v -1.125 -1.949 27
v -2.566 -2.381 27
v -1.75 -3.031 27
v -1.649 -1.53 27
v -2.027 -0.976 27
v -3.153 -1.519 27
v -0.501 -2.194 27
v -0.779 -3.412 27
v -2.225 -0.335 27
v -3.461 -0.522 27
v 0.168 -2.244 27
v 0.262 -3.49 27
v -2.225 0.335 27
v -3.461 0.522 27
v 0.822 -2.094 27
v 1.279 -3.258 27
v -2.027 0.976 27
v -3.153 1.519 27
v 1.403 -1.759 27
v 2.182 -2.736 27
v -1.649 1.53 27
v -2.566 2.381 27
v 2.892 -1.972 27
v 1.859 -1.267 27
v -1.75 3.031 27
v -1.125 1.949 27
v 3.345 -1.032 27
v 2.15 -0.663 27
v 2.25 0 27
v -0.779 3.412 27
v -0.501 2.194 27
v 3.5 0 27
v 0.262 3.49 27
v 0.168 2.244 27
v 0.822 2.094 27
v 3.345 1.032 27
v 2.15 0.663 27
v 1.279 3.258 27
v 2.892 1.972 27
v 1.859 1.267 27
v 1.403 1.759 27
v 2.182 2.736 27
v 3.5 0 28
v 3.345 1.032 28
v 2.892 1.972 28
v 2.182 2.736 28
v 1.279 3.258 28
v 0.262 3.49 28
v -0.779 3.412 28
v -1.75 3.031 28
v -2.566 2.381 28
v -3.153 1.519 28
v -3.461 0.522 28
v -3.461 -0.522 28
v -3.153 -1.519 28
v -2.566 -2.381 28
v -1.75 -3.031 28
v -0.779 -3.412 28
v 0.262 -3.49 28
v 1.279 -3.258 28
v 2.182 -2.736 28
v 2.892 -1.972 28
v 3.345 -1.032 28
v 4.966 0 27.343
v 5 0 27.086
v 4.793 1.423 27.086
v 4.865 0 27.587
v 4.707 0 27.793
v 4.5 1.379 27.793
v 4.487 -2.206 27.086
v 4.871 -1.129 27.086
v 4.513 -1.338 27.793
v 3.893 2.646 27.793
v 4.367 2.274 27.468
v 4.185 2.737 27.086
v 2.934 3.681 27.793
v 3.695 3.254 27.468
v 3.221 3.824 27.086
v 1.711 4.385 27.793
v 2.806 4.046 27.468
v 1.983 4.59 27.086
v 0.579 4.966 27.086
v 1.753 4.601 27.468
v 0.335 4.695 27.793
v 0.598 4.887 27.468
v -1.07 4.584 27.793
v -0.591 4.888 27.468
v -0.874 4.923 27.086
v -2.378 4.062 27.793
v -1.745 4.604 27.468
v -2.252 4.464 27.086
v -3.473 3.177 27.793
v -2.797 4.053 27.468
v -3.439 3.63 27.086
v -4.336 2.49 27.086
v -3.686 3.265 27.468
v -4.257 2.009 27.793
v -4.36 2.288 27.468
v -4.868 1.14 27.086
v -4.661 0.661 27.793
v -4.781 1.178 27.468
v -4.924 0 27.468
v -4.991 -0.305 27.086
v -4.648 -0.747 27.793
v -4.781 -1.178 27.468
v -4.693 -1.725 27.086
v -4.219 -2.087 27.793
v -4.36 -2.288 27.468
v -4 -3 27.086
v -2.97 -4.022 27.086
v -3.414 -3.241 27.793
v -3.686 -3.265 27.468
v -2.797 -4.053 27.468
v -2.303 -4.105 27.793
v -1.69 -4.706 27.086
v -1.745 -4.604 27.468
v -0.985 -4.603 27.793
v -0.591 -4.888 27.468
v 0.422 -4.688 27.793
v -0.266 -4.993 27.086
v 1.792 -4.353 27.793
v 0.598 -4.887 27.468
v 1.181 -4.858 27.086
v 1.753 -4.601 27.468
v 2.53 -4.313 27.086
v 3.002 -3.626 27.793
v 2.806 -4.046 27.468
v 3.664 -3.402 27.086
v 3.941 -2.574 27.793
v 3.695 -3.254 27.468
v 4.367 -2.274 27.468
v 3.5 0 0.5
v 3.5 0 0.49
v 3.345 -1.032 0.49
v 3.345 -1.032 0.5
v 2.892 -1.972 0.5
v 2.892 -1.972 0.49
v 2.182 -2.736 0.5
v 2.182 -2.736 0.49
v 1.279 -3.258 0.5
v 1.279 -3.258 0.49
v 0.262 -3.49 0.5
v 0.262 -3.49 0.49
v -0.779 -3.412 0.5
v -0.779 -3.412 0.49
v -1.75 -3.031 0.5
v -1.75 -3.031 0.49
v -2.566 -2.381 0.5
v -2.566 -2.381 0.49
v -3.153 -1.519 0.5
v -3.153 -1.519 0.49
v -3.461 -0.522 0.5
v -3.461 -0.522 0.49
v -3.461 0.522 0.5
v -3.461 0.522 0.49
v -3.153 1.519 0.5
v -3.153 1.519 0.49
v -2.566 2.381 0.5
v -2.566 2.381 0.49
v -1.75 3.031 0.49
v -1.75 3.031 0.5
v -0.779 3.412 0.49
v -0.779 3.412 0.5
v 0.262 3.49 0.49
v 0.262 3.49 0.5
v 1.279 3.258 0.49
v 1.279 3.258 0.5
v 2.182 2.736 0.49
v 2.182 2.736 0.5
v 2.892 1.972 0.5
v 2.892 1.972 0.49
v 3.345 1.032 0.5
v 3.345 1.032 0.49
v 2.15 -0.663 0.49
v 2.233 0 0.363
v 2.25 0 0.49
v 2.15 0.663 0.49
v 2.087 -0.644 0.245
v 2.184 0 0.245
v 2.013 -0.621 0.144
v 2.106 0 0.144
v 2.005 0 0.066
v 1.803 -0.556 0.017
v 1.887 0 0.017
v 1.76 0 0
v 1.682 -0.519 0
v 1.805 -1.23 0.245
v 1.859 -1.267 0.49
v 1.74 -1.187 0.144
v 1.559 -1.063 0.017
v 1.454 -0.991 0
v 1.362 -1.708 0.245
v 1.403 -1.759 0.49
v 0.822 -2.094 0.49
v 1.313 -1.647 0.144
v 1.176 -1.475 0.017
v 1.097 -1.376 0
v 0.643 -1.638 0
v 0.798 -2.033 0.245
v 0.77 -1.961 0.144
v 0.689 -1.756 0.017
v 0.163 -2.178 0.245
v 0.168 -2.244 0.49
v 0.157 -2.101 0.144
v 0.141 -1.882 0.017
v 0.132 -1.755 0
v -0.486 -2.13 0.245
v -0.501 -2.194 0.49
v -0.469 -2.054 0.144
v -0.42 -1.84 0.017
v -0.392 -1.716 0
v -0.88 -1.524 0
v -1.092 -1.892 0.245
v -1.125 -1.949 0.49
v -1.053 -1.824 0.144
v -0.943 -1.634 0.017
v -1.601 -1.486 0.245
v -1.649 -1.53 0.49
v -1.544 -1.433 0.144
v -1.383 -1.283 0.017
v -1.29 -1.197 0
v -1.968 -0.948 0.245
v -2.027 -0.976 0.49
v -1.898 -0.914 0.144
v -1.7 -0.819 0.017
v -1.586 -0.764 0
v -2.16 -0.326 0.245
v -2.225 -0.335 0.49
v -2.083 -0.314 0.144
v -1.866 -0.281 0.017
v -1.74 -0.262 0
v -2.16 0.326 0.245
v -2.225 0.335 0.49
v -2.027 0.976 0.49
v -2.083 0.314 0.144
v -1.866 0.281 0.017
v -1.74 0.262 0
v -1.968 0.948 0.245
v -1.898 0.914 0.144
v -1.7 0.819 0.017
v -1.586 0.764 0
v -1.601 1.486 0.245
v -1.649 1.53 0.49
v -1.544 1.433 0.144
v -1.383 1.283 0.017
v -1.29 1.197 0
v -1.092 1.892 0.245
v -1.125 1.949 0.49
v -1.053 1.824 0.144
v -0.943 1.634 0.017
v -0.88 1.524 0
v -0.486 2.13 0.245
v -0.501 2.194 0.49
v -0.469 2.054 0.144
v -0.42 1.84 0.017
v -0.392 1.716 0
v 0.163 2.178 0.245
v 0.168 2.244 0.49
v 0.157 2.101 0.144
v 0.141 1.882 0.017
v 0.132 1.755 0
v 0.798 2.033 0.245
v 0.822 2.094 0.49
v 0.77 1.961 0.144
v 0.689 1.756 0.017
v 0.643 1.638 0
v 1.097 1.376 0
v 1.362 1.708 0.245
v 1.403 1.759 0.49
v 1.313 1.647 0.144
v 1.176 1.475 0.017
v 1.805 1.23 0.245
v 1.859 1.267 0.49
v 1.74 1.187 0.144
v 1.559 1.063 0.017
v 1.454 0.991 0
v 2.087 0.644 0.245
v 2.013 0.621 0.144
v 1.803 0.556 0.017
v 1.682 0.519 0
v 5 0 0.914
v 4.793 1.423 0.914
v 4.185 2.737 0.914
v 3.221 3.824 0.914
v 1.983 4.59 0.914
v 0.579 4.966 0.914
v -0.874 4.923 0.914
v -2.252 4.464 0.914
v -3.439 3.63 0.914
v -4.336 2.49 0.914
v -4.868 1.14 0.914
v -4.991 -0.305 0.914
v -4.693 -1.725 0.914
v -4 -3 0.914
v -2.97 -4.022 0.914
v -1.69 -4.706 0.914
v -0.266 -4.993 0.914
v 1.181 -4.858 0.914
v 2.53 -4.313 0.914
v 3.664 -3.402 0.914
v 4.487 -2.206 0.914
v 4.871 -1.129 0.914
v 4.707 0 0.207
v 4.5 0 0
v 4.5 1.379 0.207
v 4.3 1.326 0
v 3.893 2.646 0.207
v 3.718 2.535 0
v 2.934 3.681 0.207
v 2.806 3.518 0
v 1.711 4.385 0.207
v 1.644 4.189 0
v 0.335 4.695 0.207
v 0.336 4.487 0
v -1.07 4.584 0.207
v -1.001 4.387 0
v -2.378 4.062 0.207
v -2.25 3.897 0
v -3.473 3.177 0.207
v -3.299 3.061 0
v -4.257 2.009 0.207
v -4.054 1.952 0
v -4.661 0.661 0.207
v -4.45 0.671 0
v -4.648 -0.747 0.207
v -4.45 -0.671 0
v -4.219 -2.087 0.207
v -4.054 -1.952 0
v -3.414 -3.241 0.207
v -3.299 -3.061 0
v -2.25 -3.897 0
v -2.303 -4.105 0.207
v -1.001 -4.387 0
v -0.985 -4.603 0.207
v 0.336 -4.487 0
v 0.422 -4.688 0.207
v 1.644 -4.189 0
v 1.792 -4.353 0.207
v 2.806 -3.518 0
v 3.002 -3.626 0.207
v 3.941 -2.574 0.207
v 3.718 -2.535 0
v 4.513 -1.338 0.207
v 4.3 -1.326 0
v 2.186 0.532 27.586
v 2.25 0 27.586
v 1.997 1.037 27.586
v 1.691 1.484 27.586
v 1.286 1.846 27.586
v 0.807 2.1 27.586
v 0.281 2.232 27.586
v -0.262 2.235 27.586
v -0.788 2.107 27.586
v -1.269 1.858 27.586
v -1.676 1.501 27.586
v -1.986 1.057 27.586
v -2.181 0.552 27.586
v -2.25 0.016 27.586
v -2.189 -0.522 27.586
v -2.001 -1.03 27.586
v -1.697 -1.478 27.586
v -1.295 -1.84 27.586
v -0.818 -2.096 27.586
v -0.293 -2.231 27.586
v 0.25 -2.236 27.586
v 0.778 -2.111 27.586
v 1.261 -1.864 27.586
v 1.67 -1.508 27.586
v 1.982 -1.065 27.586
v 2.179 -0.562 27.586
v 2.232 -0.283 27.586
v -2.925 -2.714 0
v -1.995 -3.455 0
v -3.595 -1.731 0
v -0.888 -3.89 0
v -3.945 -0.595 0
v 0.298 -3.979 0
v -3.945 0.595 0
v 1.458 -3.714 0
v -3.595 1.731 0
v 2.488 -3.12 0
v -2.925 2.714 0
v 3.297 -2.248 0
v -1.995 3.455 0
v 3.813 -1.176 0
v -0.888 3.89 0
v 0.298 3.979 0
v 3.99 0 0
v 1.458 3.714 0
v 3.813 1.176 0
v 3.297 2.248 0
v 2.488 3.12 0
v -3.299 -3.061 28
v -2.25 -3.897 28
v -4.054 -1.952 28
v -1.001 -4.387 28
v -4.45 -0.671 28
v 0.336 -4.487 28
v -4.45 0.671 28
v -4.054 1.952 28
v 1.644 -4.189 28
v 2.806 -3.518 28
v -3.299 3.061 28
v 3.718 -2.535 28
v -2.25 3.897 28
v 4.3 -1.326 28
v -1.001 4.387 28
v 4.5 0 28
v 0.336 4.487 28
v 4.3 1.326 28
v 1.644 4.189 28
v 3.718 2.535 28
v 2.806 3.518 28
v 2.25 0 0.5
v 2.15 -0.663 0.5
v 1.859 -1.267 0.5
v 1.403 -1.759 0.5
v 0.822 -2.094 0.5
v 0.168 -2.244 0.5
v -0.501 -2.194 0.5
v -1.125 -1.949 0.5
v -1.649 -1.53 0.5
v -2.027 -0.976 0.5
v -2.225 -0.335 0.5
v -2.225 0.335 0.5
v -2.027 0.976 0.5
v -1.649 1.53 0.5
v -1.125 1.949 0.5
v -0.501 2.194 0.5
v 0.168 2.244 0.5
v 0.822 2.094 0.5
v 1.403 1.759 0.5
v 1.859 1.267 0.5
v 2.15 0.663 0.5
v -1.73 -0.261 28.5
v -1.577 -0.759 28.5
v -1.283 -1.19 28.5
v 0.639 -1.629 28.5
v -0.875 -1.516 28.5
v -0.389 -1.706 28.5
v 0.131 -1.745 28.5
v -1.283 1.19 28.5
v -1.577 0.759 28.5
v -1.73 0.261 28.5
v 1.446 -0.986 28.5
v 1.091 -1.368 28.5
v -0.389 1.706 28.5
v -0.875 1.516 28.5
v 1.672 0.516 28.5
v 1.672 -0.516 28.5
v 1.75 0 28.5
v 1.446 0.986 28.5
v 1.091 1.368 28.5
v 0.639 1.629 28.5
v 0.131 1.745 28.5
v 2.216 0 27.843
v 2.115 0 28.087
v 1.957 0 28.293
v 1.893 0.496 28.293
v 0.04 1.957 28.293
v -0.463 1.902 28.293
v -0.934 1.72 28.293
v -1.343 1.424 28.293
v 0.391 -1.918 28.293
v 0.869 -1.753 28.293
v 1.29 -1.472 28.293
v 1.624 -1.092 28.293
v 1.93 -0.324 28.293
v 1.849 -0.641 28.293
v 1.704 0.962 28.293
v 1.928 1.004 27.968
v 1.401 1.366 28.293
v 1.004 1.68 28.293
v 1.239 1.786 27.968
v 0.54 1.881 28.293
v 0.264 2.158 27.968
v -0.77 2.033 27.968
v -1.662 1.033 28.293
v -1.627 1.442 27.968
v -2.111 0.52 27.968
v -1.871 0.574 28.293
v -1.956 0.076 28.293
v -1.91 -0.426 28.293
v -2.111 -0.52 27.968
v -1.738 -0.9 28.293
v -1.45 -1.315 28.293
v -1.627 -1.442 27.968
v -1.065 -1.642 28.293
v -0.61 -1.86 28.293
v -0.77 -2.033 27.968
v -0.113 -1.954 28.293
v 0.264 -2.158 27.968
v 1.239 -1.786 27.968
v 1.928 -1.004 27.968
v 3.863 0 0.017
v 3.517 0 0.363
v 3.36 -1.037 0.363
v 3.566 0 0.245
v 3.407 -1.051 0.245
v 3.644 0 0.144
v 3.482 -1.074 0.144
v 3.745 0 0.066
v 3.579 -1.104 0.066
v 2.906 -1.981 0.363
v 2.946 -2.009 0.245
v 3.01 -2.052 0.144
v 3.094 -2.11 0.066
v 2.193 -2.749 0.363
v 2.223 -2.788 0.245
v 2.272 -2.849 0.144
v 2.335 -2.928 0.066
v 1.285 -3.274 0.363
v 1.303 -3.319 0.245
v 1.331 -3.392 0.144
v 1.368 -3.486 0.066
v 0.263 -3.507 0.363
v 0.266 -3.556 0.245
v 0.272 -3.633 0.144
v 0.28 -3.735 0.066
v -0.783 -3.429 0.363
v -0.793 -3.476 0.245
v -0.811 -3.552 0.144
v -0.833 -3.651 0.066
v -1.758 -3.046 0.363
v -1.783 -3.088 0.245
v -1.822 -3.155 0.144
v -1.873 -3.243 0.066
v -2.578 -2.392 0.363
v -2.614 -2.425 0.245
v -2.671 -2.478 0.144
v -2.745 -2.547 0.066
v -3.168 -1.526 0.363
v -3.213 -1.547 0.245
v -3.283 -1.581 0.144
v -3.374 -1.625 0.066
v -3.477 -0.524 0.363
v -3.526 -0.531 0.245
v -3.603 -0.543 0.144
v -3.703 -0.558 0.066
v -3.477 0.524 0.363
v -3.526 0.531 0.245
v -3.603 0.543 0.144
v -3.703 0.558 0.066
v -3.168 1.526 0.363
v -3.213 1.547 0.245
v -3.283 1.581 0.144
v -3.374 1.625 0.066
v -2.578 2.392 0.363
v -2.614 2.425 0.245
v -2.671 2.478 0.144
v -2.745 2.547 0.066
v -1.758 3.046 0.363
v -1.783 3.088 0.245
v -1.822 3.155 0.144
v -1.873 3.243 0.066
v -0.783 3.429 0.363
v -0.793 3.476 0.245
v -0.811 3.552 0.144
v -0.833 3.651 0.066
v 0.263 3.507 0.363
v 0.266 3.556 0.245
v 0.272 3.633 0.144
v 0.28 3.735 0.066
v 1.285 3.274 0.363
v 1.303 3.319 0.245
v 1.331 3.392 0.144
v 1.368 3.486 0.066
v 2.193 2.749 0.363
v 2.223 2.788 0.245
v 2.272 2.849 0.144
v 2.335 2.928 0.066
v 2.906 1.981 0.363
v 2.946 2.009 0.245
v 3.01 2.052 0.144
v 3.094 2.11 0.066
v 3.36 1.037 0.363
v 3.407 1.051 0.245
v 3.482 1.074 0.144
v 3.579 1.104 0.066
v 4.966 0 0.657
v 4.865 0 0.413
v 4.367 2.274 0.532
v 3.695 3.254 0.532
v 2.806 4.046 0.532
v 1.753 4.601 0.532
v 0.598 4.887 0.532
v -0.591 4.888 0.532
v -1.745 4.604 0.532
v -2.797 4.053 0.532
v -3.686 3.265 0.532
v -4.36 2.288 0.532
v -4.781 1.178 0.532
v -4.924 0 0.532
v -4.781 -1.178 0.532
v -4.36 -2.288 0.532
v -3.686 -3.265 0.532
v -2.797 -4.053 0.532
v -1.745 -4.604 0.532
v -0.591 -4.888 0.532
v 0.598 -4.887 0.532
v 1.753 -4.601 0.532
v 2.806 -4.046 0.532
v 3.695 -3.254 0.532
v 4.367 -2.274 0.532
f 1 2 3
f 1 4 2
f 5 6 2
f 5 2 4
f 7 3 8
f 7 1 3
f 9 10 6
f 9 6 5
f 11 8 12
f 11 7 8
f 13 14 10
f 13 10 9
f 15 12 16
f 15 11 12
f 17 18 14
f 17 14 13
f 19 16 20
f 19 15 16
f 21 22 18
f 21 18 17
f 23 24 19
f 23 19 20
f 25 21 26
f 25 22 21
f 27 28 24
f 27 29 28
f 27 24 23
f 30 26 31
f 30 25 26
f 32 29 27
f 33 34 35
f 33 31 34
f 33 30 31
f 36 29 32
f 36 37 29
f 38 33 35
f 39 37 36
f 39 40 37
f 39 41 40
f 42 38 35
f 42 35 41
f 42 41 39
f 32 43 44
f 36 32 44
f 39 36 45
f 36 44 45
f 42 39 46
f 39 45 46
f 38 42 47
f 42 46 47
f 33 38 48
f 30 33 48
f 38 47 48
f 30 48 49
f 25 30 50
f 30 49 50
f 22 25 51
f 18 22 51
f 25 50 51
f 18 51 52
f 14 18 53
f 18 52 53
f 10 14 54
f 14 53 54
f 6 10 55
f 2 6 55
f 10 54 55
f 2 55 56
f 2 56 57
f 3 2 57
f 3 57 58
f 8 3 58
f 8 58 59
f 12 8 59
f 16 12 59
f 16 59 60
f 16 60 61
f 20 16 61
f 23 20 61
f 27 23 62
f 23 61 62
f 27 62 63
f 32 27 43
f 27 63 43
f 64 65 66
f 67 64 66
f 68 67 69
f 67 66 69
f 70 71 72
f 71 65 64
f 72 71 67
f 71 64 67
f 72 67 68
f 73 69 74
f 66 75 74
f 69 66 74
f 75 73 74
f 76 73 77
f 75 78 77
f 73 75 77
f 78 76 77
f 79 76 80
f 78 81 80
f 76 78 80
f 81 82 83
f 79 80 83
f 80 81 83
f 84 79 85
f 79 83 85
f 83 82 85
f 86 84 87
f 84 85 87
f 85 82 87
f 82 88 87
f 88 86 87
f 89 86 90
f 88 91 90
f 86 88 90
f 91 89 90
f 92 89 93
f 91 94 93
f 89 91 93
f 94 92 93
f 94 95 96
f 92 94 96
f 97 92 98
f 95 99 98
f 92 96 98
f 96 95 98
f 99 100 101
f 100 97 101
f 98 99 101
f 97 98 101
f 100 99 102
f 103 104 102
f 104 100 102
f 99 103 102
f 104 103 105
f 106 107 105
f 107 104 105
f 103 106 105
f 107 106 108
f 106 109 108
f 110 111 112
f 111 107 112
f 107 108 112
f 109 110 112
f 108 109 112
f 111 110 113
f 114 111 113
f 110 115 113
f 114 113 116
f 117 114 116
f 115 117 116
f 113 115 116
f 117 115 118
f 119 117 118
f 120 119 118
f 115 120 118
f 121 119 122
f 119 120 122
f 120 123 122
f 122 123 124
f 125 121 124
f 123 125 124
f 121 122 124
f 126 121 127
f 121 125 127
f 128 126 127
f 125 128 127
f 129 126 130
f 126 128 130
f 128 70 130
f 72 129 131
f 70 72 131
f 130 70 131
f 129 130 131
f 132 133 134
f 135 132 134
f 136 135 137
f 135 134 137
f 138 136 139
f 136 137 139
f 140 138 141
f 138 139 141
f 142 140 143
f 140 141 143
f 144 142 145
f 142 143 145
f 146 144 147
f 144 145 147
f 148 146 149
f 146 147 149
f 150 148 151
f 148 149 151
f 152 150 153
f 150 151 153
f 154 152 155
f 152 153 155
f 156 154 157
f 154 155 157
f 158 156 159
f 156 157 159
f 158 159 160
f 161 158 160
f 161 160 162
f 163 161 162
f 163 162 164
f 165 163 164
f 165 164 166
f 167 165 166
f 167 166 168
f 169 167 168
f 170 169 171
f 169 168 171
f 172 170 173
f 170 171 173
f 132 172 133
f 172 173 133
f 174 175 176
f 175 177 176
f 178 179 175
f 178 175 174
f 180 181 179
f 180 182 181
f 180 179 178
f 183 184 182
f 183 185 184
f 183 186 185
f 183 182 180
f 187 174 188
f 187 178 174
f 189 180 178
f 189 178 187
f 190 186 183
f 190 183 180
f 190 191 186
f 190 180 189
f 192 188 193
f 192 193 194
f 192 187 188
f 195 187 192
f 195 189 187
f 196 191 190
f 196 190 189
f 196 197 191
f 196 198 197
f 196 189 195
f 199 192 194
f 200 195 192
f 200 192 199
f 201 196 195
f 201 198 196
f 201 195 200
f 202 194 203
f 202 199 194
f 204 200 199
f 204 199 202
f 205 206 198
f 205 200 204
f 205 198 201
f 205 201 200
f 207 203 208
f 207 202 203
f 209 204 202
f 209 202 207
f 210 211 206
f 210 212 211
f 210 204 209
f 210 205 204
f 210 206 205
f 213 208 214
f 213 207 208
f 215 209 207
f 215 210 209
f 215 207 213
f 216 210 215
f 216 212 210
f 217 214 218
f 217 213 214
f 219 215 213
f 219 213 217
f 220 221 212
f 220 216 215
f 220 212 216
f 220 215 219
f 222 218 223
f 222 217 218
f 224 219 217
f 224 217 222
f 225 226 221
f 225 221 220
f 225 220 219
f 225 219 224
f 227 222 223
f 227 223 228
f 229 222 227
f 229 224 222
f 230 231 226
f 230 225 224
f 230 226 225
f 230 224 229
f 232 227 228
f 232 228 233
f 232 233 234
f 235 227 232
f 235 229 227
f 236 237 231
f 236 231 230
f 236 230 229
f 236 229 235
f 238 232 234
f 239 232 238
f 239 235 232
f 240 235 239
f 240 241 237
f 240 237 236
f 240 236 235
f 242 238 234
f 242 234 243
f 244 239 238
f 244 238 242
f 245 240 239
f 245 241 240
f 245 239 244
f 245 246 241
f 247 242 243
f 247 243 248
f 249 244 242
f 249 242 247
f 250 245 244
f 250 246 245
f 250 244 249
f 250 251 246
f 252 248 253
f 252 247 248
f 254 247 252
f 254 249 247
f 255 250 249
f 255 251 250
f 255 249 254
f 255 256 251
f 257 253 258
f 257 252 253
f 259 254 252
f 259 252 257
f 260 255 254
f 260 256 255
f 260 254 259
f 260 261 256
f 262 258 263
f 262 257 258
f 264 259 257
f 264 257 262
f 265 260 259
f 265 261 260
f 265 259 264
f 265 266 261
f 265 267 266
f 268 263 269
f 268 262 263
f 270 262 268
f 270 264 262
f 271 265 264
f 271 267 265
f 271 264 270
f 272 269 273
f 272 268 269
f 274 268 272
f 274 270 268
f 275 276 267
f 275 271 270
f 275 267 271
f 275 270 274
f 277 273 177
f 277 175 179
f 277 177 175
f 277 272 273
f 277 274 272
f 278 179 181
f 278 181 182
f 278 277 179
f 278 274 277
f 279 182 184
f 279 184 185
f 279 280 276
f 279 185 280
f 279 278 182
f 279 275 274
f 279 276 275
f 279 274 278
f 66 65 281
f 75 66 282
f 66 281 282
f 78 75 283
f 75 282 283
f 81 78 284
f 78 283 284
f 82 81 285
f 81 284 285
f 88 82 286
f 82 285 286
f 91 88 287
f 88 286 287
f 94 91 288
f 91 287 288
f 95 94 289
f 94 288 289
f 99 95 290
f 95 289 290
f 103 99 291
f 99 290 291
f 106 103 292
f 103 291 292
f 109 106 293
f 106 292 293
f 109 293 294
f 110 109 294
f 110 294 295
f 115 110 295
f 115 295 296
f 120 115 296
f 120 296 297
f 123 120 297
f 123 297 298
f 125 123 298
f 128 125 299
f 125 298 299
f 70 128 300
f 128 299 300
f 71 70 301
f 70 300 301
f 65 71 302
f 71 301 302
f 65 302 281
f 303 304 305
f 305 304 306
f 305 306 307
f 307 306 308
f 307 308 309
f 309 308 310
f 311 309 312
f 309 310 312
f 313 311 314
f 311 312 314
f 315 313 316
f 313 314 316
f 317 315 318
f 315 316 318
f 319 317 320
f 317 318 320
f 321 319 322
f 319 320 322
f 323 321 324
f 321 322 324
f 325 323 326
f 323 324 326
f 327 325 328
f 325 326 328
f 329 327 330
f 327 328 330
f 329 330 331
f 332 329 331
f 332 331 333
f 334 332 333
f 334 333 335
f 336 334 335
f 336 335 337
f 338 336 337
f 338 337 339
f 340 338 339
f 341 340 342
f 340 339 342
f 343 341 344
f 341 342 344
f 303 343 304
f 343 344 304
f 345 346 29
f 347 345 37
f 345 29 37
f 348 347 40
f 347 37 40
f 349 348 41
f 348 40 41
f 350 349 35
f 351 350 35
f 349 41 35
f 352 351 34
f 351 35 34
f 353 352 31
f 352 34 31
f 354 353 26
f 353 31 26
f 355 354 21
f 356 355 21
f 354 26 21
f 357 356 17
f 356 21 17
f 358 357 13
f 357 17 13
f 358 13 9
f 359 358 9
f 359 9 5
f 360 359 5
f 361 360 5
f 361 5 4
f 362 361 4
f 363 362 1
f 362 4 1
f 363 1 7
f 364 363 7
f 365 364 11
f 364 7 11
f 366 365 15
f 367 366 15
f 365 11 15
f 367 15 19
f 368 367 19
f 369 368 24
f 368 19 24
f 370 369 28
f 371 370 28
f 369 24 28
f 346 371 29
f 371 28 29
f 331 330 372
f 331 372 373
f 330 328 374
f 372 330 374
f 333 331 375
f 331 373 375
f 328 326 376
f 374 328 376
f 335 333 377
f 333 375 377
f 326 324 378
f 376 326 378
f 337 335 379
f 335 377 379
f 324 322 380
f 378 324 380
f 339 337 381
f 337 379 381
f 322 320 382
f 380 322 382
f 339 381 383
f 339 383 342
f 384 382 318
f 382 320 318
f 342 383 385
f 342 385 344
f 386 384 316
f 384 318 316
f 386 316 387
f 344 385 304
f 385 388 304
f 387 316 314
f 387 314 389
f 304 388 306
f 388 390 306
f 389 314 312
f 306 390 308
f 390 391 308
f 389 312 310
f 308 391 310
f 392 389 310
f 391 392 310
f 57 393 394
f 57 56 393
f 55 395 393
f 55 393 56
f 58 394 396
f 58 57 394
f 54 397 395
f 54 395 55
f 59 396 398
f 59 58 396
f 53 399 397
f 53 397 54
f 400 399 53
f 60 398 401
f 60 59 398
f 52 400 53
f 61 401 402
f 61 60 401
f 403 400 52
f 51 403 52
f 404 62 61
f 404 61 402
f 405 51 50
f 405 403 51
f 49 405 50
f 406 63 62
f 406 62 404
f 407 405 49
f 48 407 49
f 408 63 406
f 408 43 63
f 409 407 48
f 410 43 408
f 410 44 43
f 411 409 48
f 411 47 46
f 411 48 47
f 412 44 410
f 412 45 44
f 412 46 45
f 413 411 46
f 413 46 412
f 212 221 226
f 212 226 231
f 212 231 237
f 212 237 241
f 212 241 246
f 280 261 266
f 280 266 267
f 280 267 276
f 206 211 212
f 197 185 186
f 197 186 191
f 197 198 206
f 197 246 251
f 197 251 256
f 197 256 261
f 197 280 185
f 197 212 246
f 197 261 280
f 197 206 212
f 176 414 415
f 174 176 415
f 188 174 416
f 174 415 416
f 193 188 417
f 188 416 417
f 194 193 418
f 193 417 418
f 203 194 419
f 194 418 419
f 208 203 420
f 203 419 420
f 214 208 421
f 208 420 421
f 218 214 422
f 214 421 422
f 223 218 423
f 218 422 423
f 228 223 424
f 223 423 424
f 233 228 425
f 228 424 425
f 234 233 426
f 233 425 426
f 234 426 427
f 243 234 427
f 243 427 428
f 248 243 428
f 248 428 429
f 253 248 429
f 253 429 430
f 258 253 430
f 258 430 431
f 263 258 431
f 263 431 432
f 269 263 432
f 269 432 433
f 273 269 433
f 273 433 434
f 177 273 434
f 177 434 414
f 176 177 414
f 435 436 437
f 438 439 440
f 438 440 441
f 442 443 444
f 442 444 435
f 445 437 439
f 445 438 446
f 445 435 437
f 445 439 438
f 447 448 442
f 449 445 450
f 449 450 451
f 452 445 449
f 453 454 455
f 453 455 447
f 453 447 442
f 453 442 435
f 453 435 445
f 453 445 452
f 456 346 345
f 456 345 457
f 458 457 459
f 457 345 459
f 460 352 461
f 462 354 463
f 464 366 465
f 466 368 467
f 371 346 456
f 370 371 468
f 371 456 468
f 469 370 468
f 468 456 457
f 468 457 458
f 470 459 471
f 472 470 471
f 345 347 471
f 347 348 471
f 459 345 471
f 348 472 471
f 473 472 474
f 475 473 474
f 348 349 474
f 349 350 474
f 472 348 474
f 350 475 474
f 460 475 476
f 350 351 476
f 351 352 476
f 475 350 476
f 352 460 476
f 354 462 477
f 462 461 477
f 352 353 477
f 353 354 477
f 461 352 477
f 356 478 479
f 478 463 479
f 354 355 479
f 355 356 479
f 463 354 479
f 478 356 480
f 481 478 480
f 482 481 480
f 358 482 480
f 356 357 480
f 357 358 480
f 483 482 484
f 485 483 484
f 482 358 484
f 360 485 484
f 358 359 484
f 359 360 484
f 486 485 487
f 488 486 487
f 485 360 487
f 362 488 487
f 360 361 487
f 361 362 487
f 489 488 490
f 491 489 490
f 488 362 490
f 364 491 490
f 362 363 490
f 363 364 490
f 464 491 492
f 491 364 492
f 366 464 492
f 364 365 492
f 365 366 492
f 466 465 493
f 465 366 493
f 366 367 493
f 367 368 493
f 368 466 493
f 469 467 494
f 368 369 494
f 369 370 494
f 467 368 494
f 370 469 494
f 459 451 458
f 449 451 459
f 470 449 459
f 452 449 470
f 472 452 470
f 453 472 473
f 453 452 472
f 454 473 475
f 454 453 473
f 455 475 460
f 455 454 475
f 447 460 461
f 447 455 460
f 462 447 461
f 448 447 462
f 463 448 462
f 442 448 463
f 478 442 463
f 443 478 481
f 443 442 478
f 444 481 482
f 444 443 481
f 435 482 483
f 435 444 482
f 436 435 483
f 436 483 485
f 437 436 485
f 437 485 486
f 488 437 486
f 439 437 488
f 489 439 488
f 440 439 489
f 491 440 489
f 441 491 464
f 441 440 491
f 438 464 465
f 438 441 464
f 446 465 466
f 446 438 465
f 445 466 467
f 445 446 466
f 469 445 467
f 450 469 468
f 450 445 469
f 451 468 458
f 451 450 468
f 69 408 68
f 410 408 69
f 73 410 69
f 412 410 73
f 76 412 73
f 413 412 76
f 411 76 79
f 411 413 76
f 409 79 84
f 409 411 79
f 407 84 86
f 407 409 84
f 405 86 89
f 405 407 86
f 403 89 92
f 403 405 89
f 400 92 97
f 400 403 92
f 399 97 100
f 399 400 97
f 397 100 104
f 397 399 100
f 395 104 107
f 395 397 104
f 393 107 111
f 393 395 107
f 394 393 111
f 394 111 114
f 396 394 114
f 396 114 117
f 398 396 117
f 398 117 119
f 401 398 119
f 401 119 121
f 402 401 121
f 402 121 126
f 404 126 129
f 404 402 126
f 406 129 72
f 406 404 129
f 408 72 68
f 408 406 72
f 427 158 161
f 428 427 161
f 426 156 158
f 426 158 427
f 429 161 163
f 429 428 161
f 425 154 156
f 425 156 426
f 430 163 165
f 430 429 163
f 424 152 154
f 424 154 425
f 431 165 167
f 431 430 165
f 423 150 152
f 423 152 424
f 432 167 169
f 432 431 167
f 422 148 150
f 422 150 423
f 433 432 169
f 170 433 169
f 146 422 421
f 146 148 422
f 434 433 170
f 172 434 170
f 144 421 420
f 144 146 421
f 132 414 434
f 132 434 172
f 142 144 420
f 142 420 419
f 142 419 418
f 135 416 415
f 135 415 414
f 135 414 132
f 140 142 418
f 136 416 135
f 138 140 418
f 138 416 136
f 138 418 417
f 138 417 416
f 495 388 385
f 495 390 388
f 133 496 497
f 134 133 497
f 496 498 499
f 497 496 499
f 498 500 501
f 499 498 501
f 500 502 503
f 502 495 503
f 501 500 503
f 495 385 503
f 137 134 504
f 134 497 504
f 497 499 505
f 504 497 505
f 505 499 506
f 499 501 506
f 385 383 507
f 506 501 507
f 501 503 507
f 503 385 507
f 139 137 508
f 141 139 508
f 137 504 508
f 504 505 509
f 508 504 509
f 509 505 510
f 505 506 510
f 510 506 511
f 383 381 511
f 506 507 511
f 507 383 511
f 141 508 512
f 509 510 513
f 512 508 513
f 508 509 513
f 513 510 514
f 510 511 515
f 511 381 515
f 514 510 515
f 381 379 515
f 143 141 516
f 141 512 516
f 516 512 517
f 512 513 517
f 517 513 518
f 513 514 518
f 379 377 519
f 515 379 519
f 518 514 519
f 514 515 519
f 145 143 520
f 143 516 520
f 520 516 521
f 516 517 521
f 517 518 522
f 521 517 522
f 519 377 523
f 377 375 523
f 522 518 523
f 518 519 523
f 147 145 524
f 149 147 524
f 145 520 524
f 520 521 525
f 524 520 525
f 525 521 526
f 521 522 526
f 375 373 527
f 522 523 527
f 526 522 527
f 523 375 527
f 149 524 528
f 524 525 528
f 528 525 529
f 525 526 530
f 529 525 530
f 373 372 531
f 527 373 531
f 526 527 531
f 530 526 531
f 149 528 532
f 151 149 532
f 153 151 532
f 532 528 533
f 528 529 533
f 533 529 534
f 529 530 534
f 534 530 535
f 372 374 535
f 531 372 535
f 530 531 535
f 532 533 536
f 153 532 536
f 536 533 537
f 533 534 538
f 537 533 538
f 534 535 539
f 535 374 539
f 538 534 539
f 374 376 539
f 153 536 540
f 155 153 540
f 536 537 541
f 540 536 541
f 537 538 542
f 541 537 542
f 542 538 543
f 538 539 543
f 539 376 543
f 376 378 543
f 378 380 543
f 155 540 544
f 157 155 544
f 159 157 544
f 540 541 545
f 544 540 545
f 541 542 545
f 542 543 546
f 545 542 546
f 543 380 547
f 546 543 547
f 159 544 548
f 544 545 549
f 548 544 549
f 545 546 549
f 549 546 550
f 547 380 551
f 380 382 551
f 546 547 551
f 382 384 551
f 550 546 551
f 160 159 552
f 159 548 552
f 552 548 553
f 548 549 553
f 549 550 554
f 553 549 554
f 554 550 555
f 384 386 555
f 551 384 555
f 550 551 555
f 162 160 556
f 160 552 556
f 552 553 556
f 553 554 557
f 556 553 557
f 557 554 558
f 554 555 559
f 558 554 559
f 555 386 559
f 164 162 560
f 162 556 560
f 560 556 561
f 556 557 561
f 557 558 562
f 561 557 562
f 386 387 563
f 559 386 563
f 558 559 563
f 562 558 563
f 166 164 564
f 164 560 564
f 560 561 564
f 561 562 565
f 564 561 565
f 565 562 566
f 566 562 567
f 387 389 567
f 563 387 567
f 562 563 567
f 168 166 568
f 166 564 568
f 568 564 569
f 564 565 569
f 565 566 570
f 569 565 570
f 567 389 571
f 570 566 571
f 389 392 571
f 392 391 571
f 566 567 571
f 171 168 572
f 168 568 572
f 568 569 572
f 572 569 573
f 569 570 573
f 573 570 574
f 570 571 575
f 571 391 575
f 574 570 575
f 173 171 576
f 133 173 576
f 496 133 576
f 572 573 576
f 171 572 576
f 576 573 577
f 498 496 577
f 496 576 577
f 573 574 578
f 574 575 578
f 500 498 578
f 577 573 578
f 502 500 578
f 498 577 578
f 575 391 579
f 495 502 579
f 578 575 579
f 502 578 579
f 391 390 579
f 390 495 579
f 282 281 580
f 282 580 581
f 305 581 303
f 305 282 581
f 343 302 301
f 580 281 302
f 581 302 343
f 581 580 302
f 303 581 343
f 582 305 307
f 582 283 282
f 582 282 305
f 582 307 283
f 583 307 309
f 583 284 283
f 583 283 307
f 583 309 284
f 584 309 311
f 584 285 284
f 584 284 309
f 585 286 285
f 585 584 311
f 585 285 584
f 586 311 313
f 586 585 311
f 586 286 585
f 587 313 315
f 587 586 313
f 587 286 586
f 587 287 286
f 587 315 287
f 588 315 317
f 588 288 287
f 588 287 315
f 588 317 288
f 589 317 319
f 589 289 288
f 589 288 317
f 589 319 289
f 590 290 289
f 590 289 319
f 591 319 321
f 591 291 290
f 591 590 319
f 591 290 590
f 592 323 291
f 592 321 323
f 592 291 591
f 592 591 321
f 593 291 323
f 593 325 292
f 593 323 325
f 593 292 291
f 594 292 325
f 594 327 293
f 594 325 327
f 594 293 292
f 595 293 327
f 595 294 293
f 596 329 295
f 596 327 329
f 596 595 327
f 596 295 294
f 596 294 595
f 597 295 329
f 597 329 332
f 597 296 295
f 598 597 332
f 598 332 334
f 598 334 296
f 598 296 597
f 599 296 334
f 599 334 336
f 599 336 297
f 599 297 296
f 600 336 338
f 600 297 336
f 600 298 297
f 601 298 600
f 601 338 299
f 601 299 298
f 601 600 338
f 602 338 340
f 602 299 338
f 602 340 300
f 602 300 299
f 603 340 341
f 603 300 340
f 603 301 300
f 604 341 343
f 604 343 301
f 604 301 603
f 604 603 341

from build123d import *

# Parameters (mm, degrees)
SKETCH_R        = 5
PAD_DEPTH       = 28
CHAMFER_SIZE    = 0.5
CHAMFER001_SIZE = 0.5
SKETCH001_R     = 3.5
POCKET_DEPTH    = 1
FILLET_R        = 1
FILLET001_R     = 1
SKETCH002_R     = 2.25
PAD001_DEPTH    = 1.5
CHAMFER002_SIZE = 0.5
FILLET002_R     = 1
SKETCH003_R     = 3.5
POCKET001_DEPTH = 0.5
SKETCH004_R     = 2.25
POCKET002_DEPTH = 1
SKETCH005_R     = 2.25
PAD002_DEPTH    = 1
PAD003_DEPTH    = 1.5
FILLET003_R     = 0.49
FILLET004_R     = 0.49


with BuildPart() as part:
    # Sketch → Pad (new body)
    with BuildSketch(Plane.XY):
        Circle(SKETCH_R)
    extrude(amount=PAD_DEPTH)

    # Chamfer
    chamfer_edges = [part.edges().sort_by_distance(p)[0] for p in [
        (-5, 0, 0),
    ]]
    chamfer(chamfer_edges, length=CHAMFER_SIZE)

    # Chamfer001
    chamfer001_edges = [part.edges().sort_by_distance(p)[0] for p in [
        (-5, 0, 28),
    ]]
    chamfer(chamfer001_edges, length=CHAMFER001_SIZE)

    # Sketch001 (on Face4 of Chamfer001) → Pocket (cut)
    with BuildSketch(Plane.XY.offset(28)):
        Circle(SKETCH001_R)
    extrude(amount=-POCKET_DEPTH, mode=Mode.SUBTRACT)

    # Fillet
    fillet_edges = [part.edges().sort_by_distance(p)[0] for p in [
        (-5, 0, 27.5),
    ]]
    fillet(fillet_edges, radius=FILLET_R)

    # Fillet001
    fillet001_edges = [part.edges().sort_by_distance(p)[0] for p in [
        (-5, 0, 0.5),
    ]]
    fillet(fillet001_edges, radius=FILLET001_R)

    # Sketch002 (on Face9 of Fillet001) → Pad001 (join)
    with BuildSketch(Plane.XY.offset(27)):
        Circle(SKETCH002_R)
    extrude(amount=PAD001_DEPTH)

    # Chamfer002
    chamfer002_edges = [part.edges().sort_by_distance(p)[0] for p in [
        (-2.25, 0, 28.5),
    ]]
    chamfer(chamfer002_edges, length=CHAMFER002_SIZE)

    # Fillet002
    fillet002_edges = [part.edges().sort_by_distance(p)[0] for p in [
        (-2.25, 0, 28),
    ]]
    fillet(fillet002_edges, radius=FILLET002_R)

    # Sketch003 (on Face6 of Pad001) → Pocket001 (cut)
    with BuildSketch(Plane(origin=(0, 0, 0), x_dir=(1, 0, 0), z_dir=(0, 0, -1))):
        Circle(SKETCH003_R)
    extrude(amount=-POCKET001_DEPTH, mode=Mode.SUBTRACT)

    # Sketch004 (on Face15 of Pocket001) → Pocket002 (cut)
    with BuildSketch(Plane(origin=(0, 0, 0.5), x_dir=(1, 0, 0), z_dir=(0, 0, -1))):
        Circle(SKETCH004_R)
    extrude(amount=-POCKET002_DEPTH, mode=Mode.SUBTRACT)

    # Sketch005 (on Face17 of Pocket002) → Pad002 (join)
    with BuildSketch(Plane(origin=(0, 0, 1.5), x_dir=(1, 0, 0), z_dir=(0, 0, -1))):
        Circle(SKETCH005_R)
    extrude(amount=PAD002_DEPTH)

    # Sketch005 (on Face17 of Pocket002) → Pad003 (join)
    with BuildSketch(Plane(origin=(0, 0, 1.5), x_dir=(1, 0, 0), z_dir=(0, 0, -1))):
        Circle(SKETCH005_R)
    extrude(amount=PAD003_DEPTH)

    # Fillet003
    fillet003_edges = [part.edges().sort_by_distance(p)[0] for p in [
        (-2.25, 0, 0),
    ]]
    fillet(fillet003_edges, radius=FILLET003_R)

    # Fillet004
    fillet004_edges = [part.edges().sort_by_distance(p)[0] for p in [
        (-3.5, 0, 0),
    ]]
    fillet(fillet004_edges, radius=FILLET004_R)


solid = part.part
